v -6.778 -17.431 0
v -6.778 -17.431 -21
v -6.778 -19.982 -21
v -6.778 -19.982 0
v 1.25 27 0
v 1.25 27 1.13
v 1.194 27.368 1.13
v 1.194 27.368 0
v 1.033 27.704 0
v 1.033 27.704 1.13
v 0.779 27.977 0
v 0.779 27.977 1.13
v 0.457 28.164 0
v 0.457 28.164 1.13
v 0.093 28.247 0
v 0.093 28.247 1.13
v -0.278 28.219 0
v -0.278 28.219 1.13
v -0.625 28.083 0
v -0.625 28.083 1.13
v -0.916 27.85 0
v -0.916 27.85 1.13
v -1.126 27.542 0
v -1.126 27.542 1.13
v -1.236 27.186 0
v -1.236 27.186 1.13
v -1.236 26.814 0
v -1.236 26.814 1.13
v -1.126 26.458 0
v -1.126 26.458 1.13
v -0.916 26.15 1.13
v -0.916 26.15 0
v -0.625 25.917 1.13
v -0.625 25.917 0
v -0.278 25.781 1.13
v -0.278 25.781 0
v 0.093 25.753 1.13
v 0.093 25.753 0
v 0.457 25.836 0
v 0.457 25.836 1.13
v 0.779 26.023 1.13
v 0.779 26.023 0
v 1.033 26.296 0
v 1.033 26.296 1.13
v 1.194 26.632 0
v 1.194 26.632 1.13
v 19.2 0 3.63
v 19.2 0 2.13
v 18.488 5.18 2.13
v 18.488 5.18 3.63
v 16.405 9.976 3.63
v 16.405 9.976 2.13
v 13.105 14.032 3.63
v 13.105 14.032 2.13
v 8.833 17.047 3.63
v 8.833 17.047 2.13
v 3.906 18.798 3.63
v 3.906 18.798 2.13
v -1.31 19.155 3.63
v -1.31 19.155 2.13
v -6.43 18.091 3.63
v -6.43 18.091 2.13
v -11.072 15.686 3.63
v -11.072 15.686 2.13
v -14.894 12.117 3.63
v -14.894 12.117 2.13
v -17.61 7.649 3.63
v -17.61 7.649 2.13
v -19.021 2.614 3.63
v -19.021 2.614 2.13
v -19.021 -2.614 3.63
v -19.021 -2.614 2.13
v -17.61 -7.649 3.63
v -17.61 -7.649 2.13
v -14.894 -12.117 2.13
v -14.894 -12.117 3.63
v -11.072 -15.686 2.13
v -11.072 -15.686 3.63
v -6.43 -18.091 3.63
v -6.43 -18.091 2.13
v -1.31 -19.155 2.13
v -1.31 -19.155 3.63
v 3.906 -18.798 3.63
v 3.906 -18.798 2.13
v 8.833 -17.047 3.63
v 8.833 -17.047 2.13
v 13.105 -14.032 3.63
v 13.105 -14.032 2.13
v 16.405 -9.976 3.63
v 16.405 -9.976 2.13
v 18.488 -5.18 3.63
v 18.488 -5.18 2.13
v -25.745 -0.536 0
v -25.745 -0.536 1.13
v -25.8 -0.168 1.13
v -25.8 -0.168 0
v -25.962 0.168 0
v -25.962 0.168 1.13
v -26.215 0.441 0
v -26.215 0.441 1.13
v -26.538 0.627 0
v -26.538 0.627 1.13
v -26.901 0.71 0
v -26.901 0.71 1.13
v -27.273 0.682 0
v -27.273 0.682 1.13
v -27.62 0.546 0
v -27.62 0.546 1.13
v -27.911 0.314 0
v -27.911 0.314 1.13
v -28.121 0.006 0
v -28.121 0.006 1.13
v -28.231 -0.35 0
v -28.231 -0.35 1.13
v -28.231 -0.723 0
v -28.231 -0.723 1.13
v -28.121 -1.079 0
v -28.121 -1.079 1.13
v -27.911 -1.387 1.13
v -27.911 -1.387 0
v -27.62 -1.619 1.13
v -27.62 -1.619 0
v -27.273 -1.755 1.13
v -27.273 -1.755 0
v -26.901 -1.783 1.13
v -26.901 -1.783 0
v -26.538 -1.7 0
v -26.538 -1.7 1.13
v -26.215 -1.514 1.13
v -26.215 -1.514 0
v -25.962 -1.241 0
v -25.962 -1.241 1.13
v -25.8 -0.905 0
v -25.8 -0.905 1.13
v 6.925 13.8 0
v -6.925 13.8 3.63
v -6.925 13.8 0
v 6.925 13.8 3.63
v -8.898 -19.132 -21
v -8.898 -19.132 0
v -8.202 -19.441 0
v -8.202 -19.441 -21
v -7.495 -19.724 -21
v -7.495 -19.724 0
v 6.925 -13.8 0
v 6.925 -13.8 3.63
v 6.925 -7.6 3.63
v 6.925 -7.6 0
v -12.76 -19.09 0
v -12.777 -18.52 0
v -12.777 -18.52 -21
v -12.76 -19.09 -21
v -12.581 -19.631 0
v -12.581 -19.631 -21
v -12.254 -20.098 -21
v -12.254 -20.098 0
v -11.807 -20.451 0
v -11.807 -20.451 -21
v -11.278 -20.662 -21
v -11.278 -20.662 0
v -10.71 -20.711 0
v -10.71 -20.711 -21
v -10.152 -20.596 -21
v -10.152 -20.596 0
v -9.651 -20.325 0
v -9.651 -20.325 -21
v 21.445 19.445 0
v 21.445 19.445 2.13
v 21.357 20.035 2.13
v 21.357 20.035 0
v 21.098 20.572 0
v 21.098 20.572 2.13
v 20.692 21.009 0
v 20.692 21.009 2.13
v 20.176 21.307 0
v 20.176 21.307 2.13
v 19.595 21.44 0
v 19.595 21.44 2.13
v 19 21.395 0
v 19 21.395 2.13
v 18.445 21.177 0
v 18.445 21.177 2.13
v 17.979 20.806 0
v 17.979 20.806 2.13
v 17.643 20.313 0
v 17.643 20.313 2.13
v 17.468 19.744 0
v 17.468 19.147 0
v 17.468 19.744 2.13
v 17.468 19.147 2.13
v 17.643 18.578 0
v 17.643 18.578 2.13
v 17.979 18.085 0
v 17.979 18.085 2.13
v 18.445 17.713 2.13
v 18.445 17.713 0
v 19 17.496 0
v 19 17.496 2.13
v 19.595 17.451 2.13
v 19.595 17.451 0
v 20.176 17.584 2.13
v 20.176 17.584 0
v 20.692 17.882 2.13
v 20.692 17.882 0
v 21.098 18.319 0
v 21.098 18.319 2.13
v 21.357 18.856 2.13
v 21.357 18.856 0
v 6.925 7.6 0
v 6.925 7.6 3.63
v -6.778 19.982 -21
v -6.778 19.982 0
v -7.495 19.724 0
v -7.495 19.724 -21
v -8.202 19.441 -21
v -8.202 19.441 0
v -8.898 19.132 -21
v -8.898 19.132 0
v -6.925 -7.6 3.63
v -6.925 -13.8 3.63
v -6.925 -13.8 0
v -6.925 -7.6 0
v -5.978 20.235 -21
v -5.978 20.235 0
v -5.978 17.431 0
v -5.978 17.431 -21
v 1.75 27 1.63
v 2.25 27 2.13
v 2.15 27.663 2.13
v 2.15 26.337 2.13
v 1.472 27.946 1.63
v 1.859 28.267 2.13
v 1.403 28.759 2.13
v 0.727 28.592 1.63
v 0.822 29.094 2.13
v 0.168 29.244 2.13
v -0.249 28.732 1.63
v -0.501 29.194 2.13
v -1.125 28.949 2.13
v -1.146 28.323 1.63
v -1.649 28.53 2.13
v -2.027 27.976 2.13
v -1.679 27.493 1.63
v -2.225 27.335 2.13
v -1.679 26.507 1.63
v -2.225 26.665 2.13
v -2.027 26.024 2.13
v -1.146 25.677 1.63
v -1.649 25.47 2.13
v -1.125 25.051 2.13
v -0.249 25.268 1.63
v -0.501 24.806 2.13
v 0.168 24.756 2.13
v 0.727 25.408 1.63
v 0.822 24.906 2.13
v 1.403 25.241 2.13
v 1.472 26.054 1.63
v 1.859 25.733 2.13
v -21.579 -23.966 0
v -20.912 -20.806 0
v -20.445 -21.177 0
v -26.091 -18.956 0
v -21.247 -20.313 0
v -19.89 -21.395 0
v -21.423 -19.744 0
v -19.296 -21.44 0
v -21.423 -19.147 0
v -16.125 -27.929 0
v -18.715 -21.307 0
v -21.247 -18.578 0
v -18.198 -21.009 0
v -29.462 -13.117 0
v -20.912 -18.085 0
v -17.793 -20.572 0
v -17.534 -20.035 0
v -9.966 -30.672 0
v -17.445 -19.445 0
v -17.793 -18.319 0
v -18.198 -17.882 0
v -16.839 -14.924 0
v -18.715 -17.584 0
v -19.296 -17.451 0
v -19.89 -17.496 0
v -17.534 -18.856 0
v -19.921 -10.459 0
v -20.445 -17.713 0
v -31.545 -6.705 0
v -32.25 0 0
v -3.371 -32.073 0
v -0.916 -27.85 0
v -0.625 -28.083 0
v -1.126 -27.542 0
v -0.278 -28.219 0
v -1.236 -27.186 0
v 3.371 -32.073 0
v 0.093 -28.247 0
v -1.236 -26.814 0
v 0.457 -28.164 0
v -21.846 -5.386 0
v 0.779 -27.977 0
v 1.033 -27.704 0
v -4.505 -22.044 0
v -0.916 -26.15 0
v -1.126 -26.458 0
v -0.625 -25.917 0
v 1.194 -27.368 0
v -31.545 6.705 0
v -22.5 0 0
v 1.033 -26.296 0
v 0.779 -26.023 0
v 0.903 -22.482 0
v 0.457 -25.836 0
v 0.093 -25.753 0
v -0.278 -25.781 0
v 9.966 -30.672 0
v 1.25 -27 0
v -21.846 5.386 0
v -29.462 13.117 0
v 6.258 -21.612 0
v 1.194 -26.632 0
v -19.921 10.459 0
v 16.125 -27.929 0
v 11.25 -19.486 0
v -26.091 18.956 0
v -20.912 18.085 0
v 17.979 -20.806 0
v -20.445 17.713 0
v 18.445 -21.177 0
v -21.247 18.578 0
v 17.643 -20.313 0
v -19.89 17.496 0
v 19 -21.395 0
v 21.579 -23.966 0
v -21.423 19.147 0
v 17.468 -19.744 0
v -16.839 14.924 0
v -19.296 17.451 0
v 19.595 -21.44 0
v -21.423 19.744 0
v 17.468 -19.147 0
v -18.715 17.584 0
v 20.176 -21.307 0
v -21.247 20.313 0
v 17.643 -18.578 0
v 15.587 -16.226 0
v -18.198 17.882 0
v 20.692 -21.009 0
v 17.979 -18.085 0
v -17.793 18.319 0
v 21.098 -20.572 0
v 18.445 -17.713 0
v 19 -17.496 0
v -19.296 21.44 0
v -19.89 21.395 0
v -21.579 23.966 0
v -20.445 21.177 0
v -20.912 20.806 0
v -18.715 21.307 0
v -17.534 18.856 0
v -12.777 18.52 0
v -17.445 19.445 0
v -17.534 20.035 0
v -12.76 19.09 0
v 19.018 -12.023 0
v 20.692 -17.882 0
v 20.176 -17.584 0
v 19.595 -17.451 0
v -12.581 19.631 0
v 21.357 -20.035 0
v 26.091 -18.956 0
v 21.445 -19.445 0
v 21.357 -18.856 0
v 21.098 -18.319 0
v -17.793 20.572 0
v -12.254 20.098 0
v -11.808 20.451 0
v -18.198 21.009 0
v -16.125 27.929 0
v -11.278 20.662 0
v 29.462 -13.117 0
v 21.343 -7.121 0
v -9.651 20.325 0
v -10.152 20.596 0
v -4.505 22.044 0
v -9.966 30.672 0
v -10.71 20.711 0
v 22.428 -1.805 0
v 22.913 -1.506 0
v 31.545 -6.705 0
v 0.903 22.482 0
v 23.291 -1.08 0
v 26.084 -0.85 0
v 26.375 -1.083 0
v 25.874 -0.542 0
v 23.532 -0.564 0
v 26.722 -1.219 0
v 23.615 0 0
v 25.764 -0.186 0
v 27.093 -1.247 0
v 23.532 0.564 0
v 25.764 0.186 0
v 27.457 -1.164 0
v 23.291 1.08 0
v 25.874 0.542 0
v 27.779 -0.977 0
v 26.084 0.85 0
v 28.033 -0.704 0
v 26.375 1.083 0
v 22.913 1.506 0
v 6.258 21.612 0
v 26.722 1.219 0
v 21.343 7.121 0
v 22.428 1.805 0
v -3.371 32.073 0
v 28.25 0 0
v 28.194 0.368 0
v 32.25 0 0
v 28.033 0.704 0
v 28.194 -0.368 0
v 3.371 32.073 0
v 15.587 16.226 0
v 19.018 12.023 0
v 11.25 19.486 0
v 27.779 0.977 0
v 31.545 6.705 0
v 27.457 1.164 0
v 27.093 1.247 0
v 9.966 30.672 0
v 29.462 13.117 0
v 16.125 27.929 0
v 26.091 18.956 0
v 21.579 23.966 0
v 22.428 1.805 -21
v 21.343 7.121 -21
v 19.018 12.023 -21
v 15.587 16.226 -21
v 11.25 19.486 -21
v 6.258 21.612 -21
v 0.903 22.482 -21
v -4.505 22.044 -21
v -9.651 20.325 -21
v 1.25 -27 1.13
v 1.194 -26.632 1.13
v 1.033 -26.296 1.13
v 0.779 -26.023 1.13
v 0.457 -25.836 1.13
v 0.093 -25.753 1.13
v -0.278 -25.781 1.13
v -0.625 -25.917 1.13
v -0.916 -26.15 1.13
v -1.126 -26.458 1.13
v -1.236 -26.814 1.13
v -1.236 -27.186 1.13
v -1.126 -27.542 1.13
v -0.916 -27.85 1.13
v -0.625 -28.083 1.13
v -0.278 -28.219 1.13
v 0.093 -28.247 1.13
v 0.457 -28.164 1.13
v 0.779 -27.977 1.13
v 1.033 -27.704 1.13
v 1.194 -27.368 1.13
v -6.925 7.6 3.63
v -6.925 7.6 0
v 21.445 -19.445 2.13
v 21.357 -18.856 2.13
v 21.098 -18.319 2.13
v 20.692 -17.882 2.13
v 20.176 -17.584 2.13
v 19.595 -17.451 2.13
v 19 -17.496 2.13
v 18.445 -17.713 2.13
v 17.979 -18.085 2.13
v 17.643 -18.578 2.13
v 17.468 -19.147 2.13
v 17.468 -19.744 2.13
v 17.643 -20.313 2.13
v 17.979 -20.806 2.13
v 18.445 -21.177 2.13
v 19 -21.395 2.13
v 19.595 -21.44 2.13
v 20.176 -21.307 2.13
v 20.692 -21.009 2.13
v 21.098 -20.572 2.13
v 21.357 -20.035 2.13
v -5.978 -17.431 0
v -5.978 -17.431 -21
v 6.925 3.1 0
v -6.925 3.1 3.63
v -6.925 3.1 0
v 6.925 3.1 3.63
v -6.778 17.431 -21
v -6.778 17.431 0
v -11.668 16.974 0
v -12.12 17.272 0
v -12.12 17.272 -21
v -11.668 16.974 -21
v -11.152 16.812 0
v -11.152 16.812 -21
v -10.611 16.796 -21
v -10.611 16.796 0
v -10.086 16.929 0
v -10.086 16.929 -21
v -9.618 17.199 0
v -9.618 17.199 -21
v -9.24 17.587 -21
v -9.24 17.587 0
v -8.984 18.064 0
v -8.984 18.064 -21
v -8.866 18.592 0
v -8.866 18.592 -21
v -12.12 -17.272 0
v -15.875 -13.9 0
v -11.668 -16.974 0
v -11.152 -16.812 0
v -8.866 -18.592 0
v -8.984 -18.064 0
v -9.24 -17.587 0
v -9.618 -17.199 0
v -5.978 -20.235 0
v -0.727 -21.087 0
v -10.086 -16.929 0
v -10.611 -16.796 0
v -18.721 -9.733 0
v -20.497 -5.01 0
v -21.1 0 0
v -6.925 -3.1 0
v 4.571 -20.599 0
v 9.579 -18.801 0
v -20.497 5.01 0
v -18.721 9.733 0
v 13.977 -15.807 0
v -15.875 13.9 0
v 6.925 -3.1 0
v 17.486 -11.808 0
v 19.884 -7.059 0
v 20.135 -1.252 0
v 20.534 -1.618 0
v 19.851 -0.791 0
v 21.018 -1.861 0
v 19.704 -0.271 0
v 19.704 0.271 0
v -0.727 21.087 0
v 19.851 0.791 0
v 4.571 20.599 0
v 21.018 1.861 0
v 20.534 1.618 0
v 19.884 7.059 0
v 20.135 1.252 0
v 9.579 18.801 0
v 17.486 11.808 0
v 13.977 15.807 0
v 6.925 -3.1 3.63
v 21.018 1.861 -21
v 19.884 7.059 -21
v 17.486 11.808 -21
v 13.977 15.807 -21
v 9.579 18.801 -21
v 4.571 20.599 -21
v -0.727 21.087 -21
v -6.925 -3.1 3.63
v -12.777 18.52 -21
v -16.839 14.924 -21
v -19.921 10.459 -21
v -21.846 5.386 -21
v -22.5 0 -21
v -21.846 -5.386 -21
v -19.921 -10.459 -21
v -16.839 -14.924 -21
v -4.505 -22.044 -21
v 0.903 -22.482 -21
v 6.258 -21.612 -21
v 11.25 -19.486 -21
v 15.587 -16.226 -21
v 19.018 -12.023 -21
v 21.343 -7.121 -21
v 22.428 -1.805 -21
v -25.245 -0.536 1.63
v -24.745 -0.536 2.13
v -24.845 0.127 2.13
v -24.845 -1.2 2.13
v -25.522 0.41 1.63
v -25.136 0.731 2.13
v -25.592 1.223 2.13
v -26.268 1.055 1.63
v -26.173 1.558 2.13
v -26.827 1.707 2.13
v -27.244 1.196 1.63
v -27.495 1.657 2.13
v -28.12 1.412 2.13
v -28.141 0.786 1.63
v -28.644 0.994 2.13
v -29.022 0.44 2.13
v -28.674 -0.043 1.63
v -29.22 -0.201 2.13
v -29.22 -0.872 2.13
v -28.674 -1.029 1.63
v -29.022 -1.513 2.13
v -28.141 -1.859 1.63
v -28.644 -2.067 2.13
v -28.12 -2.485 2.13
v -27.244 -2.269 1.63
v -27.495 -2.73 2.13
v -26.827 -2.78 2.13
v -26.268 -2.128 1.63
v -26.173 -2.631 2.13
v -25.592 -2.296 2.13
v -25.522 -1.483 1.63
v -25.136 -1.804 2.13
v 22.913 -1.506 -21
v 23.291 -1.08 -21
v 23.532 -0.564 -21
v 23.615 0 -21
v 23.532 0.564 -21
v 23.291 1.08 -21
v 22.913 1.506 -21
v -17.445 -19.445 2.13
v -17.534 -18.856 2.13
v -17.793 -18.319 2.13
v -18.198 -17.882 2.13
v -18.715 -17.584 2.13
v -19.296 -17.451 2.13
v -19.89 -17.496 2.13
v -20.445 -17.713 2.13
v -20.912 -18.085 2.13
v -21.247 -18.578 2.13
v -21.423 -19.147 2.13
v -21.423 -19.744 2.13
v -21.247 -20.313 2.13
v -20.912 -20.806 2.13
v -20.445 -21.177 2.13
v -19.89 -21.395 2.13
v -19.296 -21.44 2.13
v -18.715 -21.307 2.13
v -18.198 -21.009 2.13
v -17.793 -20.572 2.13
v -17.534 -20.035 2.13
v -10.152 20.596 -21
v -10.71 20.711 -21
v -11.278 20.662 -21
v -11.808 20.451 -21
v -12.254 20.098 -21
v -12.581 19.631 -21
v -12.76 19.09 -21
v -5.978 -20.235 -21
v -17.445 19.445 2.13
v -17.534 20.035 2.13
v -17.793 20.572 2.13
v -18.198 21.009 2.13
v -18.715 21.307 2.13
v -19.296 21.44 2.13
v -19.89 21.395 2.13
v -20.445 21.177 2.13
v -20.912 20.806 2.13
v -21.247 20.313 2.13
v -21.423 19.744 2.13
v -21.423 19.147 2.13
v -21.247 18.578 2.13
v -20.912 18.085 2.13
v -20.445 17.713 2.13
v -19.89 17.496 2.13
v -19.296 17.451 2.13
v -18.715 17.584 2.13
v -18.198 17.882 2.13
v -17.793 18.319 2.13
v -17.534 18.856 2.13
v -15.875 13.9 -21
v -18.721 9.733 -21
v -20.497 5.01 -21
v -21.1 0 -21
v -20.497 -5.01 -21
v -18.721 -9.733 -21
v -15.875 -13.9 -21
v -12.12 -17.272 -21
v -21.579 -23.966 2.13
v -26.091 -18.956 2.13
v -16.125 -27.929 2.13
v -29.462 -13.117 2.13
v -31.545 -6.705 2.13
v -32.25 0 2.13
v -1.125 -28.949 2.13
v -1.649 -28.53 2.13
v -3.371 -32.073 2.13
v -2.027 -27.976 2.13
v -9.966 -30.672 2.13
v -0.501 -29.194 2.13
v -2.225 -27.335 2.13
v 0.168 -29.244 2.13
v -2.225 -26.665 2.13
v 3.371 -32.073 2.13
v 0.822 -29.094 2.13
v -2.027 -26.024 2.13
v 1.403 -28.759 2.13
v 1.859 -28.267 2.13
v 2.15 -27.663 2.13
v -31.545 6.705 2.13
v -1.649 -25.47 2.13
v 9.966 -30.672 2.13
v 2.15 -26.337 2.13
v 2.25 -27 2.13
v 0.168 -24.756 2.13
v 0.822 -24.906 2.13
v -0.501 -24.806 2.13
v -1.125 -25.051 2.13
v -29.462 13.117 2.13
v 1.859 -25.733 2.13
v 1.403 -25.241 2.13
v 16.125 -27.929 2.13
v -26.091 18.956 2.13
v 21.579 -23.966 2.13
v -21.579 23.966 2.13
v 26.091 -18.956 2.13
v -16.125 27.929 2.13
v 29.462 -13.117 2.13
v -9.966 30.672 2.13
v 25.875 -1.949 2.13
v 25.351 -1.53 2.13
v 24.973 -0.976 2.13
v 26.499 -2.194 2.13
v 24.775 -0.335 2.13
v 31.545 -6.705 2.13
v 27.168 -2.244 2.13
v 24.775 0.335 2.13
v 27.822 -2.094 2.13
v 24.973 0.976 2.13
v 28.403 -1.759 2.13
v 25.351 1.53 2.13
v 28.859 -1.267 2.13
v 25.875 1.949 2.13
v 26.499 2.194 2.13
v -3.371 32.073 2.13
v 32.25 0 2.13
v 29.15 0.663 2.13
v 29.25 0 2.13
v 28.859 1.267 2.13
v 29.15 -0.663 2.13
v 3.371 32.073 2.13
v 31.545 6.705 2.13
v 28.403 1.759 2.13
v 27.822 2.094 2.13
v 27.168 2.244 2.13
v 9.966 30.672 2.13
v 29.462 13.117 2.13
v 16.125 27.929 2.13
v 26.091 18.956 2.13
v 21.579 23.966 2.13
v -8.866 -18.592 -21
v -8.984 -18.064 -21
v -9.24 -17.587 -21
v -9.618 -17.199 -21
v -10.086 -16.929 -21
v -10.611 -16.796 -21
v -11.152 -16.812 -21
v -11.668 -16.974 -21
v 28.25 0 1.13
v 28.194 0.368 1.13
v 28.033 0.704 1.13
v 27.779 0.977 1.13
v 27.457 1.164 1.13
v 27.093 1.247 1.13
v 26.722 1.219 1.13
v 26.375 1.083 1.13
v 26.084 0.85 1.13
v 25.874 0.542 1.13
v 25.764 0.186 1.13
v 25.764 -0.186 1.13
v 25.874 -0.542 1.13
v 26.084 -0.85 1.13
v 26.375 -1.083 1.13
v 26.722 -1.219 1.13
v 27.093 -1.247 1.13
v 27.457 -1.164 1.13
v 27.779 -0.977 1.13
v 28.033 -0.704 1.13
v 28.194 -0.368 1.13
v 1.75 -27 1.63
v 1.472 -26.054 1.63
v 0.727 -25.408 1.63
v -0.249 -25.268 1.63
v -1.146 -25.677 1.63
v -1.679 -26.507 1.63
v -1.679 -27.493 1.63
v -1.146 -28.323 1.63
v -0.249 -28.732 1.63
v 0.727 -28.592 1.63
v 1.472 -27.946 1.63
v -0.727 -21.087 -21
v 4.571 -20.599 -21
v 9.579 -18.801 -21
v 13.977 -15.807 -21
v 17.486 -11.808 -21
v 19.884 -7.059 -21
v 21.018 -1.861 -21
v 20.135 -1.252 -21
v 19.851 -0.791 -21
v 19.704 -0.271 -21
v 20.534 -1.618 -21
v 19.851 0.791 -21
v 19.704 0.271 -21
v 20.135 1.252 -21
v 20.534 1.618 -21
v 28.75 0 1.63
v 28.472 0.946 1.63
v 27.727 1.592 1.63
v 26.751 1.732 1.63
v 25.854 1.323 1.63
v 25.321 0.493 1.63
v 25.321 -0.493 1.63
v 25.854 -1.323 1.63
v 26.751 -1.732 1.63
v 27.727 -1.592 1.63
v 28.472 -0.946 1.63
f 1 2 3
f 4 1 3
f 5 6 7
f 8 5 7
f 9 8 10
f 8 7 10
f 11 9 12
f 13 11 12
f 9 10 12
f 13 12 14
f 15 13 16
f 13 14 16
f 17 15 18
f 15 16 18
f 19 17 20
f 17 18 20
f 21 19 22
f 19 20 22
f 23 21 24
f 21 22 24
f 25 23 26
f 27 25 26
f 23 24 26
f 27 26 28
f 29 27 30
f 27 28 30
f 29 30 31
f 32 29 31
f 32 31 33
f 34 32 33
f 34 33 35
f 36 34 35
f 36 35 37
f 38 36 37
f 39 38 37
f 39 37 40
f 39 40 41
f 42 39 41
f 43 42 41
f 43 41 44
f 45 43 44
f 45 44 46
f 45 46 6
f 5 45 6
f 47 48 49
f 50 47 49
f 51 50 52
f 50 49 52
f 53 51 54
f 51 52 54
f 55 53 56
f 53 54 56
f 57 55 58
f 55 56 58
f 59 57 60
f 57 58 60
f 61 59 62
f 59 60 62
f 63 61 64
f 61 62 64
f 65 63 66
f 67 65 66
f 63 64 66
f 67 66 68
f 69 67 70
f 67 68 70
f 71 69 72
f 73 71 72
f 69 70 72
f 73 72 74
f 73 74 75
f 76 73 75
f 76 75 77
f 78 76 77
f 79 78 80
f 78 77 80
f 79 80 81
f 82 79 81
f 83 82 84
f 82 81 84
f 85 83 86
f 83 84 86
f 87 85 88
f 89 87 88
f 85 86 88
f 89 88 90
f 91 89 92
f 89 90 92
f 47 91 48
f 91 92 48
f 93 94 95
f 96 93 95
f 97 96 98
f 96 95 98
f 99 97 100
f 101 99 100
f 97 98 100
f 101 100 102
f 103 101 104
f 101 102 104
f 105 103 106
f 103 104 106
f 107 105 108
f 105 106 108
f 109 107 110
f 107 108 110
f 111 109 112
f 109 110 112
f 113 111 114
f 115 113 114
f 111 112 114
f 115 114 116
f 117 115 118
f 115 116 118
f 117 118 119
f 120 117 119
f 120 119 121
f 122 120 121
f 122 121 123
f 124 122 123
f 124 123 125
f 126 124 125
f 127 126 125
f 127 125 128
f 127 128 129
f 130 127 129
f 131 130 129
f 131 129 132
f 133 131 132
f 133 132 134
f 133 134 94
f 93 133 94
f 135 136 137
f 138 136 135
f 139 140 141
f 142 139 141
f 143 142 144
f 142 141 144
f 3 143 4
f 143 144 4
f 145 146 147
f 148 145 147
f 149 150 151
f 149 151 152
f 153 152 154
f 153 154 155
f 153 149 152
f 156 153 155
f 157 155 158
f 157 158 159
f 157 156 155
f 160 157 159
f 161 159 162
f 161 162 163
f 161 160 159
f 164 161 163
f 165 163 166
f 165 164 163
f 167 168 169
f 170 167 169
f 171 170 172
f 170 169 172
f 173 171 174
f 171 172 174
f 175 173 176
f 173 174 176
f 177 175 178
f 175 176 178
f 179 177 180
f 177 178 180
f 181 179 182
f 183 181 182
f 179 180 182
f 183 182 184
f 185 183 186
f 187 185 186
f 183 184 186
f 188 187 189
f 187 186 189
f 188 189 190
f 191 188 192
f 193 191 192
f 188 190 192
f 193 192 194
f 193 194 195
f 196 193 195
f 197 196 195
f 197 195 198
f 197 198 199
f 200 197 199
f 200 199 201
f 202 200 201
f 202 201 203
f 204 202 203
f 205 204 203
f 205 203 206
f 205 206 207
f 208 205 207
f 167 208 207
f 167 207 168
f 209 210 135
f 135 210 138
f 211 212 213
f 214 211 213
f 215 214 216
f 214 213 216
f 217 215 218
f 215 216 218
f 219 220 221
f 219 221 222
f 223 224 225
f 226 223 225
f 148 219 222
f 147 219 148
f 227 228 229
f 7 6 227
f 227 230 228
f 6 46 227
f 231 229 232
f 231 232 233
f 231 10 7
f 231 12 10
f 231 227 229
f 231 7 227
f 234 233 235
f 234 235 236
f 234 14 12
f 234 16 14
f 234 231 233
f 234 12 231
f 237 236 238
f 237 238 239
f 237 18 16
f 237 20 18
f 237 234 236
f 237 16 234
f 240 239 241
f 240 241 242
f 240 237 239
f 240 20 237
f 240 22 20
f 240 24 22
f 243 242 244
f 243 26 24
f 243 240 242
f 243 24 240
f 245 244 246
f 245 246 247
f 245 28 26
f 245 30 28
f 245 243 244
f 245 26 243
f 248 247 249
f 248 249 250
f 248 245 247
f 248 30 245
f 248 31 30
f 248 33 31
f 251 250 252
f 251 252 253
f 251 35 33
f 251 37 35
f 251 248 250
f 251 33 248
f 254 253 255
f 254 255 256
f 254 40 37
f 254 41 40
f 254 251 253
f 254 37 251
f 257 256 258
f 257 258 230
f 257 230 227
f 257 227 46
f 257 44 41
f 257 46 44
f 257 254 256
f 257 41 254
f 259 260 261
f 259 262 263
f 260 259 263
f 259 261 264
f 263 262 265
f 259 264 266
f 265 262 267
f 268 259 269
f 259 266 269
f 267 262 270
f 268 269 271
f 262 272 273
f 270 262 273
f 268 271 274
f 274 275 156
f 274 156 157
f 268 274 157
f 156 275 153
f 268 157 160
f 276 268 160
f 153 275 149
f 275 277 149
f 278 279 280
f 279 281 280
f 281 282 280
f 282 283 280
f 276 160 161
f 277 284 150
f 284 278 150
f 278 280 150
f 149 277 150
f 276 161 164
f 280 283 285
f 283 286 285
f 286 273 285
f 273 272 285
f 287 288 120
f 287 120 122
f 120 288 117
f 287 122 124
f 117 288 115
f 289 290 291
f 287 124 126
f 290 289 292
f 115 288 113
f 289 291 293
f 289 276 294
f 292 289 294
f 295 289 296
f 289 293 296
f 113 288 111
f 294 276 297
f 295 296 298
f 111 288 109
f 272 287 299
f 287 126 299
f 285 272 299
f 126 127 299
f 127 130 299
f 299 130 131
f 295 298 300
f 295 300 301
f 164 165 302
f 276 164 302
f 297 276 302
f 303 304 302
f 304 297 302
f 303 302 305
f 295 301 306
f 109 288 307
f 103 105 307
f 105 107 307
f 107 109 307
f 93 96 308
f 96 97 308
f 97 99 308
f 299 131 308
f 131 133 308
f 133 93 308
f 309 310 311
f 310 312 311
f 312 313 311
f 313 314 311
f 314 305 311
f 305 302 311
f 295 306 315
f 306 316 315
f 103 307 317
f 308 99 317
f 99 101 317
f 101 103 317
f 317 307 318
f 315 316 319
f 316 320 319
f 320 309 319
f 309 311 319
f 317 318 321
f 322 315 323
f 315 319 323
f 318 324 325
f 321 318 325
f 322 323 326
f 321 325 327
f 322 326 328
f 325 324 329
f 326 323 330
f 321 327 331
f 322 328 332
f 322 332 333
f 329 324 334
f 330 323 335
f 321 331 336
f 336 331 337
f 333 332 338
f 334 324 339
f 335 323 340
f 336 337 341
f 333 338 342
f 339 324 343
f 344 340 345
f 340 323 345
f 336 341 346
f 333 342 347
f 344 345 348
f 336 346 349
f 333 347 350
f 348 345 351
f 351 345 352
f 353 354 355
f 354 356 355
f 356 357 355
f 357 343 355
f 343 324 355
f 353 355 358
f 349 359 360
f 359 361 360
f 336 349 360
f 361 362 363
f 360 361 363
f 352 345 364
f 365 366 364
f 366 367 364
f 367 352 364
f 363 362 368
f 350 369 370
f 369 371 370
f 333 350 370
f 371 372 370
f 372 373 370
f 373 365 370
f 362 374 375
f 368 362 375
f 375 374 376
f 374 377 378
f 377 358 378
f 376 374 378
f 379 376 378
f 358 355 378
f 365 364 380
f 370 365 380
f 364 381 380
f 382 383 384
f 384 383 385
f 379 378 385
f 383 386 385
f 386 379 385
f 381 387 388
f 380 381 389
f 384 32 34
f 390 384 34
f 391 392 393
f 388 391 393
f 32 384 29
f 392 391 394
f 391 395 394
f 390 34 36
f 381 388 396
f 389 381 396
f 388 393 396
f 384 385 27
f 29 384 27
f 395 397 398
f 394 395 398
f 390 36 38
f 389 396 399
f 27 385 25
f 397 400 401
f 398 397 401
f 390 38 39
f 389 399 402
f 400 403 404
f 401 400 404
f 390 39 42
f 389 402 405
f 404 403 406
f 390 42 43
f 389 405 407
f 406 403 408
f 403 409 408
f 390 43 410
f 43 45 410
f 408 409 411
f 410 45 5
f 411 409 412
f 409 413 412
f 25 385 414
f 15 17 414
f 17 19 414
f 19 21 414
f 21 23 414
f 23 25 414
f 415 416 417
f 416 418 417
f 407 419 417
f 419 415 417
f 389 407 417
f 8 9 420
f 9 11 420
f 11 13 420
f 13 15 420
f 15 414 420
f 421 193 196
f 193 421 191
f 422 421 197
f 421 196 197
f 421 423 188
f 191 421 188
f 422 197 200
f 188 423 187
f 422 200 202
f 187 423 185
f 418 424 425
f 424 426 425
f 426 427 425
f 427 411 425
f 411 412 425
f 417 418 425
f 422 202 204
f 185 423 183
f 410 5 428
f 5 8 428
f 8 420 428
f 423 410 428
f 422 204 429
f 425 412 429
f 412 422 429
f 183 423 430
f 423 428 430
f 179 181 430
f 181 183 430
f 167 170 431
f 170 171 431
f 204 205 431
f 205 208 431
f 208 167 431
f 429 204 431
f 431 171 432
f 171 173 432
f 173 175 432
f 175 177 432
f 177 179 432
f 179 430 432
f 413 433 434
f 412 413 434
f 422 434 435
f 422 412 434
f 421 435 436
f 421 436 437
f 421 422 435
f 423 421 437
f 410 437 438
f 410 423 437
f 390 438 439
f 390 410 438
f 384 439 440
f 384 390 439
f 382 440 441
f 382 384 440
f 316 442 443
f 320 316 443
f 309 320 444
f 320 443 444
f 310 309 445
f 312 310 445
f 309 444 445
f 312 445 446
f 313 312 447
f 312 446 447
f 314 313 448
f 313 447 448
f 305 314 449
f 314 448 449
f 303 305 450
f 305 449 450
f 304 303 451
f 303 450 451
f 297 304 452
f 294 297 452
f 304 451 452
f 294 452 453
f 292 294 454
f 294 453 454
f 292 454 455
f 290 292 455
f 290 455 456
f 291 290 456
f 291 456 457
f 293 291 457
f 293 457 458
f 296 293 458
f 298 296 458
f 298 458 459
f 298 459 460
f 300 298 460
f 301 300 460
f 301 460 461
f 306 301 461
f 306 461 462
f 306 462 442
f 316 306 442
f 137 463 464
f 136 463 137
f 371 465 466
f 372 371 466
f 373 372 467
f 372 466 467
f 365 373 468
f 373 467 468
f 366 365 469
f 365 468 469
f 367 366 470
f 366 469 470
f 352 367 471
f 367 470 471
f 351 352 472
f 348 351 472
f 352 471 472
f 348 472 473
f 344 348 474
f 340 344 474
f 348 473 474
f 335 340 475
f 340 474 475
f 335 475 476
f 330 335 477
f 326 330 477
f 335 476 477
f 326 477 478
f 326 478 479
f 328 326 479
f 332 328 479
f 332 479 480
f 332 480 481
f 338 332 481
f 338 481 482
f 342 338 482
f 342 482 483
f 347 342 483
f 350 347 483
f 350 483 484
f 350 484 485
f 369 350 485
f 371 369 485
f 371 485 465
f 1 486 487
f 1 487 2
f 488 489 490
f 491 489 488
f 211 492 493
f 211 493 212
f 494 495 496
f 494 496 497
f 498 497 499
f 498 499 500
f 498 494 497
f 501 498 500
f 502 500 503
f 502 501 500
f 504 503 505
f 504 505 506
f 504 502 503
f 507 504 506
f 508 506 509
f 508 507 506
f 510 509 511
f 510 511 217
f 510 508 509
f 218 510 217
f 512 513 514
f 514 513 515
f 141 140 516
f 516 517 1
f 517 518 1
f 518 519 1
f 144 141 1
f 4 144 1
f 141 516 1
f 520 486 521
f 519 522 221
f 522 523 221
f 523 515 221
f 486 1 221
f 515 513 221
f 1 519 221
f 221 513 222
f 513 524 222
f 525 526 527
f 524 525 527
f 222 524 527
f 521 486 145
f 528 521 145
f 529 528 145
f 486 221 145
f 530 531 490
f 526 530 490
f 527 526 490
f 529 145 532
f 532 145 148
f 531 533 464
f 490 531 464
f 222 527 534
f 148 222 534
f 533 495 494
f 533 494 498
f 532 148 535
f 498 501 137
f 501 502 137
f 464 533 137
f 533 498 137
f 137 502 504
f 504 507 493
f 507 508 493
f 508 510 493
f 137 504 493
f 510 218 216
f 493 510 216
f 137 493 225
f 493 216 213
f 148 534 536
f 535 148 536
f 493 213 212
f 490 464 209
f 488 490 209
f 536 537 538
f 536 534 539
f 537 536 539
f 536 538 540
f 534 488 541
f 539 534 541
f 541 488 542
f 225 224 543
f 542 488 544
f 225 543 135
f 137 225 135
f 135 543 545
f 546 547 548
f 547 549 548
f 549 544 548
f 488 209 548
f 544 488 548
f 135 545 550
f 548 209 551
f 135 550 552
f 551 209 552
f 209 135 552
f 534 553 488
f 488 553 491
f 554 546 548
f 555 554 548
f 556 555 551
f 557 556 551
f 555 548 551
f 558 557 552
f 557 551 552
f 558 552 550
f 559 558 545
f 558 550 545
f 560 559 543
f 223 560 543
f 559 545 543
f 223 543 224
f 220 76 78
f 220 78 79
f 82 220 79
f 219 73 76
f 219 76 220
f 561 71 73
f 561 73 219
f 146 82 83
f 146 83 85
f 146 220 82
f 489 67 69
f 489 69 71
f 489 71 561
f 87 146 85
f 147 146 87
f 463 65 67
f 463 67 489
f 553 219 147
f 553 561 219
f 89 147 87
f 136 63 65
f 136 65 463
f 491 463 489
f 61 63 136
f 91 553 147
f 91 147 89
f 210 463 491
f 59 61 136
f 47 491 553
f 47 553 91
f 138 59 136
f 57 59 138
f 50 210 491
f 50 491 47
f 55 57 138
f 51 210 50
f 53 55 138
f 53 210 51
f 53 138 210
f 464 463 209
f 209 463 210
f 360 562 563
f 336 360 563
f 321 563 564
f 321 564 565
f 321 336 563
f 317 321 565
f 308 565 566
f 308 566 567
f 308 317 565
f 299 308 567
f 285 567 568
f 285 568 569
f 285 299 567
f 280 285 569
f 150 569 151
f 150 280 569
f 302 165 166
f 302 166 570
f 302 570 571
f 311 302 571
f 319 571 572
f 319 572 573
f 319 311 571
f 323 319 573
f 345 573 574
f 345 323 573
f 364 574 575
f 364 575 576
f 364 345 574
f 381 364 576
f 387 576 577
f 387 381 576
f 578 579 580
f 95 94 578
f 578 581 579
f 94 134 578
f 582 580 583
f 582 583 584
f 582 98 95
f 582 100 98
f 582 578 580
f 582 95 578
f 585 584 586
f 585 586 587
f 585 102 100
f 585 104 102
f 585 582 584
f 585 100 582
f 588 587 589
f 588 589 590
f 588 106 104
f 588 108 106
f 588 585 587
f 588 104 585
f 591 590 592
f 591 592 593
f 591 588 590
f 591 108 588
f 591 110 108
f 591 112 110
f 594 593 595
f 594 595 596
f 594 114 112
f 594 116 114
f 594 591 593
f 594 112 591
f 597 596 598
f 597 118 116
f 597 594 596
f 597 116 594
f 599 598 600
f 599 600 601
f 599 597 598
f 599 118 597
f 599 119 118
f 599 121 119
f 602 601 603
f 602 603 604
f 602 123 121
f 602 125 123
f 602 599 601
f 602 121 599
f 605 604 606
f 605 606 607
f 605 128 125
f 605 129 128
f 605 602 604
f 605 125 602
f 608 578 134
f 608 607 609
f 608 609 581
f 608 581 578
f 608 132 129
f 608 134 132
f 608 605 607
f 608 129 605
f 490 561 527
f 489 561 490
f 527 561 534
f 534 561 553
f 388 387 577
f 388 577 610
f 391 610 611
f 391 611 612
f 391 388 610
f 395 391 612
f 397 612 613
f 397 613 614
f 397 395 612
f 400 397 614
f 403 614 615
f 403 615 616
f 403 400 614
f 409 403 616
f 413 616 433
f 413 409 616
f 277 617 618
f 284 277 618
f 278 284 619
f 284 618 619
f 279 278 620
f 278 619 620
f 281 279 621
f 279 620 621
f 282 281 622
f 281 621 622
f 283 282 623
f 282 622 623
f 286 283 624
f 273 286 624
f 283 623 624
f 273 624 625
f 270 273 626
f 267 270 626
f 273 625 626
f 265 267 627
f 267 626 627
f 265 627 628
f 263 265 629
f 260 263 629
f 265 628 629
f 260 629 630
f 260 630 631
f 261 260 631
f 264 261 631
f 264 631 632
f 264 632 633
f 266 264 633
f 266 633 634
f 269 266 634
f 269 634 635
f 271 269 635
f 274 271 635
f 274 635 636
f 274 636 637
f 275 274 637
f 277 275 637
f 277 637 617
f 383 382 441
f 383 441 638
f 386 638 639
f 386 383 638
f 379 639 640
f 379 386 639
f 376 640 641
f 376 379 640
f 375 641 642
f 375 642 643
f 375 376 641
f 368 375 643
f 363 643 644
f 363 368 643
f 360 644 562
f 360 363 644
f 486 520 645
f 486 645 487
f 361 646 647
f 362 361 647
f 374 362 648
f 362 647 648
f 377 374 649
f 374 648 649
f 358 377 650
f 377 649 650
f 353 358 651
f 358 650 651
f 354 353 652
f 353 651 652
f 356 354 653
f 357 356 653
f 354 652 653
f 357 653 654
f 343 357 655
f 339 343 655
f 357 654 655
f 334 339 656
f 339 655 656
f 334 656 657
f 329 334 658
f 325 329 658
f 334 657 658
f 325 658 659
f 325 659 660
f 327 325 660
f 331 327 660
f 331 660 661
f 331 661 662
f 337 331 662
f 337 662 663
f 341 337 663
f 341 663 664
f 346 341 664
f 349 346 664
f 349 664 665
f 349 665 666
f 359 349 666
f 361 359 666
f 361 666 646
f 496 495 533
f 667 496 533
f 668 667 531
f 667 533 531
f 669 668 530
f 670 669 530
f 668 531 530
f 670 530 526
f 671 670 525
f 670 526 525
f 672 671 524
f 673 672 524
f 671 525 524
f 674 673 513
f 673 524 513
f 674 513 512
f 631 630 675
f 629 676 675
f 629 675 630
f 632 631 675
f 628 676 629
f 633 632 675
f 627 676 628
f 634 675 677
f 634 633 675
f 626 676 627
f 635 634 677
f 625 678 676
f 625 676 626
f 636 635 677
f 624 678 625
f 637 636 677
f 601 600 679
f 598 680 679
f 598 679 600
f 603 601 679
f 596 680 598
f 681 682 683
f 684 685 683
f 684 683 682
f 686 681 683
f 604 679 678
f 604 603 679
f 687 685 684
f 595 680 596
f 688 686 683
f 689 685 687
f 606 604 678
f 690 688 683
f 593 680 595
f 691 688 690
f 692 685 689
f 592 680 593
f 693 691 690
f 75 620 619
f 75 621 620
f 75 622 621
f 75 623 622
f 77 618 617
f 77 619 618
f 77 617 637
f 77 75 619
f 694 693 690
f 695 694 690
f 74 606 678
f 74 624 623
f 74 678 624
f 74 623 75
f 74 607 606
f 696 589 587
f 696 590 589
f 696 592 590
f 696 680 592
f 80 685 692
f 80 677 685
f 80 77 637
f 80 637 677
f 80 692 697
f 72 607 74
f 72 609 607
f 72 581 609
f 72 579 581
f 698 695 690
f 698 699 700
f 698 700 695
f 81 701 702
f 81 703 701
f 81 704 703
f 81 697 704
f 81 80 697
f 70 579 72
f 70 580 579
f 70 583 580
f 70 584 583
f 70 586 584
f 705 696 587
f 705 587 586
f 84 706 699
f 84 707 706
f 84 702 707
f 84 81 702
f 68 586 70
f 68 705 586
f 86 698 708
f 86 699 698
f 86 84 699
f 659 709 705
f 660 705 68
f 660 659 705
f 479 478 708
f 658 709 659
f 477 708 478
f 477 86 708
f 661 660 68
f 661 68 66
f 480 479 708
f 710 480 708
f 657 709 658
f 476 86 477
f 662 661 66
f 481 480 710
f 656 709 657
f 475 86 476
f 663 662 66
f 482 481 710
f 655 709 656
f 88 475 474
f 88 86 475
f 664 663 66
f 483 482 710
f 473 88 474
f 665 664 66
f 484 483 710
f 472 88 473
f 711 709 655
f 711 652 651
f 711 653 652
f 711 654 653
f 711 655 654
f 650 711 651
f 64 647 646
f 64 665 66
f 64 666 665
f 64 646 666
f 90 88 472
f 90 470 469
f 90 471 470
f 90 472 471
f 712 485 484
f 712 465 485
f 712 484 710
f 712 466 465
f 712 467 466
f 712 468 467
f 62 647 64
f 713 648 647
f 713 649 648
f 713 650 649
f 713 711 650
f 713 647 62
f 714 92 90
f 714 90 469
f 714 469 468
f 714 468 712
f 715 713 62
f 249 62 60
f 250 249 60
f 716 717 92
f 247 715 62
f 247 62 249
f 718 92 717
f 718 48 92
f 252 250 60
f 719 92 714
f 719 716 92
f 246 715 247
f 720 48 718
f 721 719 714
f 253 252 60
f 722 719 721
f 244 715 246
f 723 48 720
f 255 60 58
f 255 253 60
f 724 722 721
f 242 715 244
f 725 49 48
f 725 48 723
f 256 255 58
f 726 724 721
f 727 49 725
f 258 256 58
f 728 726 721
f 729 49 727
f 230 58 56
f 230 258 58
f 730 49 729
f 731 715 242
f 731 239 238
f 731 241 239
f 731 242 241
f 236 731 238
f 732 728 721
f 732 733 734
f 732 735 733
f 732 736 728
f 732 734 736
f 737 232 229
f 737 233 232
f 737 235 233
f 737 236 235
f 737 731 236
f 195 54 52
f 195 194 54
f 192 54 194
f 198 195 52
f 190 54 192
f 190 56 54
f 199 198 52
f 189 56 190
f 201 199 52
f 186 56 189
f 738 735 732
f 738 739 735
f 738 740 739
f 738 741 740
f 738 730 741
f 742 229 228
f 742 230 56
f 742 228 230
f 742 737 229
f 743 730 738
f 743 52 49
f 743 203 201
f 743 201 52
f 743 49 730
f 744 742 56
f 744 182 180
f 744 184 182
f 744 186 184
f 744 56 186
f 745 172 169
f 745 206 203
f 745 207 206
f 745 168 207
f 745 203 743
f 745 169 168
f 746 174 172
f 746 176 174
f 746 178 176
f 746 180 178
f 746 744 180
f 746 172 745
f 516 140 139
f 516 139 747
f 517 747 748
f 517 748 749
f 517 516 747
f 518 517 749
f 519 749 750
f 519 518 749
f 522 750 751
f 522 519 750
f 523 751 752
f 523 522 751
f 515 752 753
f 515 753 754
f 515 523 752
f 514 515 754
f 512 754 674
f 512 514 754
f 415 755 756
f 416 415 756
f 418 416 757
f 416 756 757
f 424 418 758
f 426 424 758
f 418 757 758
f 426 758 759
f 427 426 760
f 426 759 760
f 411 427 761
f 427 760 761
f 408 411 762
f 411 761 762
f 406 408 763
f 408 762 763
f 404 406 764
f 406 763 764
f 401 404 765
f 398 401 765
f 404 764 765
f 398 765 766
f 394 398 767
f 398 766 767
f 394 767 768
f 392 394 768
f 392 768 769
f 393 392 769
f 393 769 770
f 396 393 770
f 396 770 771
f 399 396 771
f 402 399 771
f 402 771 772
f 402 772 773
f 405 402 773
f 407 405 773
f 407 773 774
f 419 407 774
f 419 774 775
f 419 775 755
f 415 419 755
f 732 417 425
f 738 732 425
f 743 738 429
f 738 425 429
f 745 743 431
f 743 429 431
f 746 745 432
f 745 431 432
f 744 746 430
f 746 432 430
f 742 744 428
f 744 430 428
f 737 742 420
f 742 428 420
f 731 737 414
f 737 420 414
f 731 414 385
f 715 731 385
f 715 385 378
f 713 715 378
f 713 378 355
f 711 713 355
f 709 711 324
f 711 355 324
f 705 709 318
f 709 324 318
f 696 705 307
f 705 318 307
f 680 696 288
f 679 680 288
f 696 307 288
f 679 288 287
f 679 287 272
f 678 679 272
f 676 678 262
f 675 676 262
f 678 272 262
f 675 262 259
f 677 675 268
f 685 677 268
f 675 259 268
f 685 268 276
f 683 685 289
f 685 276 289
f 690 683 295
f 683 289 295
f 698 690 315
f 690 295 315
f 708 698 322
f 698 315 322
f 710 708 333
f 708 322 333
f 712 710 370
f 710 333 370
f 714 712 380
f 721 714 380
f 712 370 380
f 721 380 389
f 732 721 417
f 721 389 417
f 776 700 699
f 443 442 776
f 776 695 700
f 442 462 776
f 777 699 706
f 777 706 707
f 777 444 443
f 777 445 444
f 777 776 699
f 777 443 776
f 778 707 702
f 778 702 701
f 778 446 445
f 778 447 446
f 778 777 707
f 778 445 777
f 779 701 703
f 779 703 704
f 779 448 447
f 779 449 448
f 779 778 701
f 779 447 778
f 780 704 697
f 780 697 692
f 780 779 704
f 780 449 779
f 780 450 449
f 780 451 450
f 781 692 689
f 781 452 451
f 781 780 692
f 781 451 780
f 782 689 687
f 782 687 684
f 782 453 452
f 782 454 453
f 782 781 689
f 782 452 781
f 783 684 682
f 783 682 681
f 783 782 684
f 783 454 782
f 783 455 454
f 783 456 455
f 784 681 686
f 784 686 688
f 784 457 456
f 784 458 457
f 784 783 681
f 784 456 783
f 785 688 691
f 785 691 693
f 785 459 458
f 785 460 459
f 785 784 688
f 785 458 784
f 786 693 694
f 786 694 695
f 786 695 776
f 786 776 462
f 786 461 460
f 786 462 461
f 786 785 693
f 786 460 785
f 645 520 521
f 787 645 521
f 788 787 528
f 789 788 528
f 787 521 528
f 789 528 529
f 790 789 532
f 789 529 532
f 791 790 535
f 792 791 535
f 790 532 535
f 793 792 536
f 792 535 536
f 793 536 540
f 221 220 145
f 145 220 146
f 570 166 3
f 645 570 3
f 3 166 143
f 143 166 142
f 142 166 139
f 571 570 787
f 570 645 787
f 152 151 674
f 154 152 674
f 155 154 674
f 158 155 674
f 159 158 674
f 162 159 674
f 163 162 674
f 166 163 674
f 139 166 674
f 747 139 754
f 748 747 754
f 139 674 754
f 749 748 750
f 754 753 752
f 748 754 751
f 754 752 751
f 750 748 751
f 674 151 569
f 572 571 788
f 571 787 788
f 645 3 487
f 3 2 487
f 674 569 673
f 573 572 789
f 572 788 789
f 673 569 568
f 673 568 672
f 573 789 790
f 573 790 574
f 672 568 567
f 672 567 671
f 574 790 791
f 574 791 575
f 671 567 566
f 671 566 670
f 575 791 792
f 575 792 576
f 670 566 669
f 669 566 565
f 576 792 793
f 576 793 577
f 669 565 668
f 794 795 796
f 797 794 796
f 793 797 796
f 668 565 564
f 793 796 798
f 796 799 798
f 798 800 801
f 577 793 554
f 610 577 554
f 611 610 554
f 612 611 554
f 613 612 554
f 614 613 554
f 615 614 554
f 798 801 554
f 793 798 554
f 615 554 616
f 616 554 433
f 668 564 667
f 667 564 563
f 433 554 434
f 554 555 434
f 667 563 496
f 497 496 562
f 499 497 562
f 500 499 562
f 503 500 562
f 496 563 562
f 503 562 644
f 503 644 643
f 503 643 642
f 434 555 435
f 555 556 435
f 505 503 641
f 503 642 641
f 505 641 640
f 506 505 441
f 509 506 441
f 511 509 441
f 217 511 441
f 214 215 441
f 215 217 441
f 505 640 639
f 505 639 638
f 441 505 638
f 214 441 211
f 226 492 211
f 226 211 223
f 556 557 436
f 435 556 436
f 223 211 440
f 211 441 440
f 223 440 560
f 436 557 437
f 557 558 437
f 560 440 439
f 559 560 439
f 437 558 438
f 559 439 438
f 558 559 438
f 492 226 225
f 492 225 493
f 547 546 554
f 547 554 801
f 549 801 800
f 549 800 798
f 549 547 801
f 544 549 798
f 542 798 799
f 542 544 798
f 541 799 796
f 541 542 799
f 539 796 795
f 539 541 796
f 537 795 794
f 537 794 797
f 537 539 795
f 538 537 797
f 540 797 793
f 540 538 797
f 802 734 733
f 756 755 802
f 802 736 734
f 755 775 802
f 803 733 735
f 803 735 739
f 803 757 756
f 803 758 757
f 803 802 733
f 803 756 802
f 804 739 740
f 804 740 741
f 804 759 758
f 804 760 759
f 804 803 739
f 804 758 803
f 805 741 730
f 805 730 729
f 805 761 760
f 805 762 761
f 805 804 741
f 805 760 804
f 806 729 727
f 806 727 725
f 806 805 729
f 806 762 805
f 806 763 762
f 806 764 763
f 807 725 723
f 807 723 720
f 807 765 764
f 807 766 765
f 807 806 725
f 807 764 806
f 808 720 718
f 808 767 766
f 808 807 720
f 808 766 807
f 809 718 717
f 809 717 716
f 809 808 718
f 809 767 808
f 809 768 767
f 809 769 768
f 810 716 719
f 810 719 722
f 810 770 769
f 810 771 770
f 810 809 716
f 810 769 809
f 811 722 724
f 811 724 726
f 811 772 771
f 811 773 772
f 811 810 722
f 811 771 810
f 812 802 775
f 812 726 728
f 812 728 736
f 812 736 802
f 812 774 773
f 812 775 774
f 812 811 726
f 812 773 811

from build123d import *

# Parameters (mm, degrees)
SKETCH_R          = 32.25
PAD_DEPTH         = 2.13
SKETCH004_R       = 1.25
SKETCH004_R_2     = 2
POCKET001_DEPTH   = 5
CHAMFER_SIZE      = 1
SKETCH001_R       = 19.2
PAD001_DEPTH      = 1.5
SKETCH003_W       = 13.85
SKETCH003_H       = 6.2
POCKET_DEPTH      = 2.131
POCKET_DEPTH_BACK = 1.501
SKETCH009_R       = 18
POCKET002_DEPTH   = 2
PAD002_DEPTH      = 21


with BuildPart() as part:
    # Sketch → Pad (new body)
    with BuildSketch(Plane.XY):
        Circle(SKETCH_R)
    extrude(amount=PAD_DEPTH)

    # Sketch004 → Pocket001 (cut)
    with BuildSketch(Plane.XY.offset(2.13)):
        with Locations((0, 27)):
            Circle(SKETCH004_R)
        with Locations((19.445436, 19.445436)):
            Circle(SKETCH004_R_2)
        with Locations((27, 0)):
            Circle(SKETCH004_R)
        with Locations((0, -27)):
            Circle(SKETCH004_R)
        with Locations((-19.445436, -19.445436)):
            Circle(SKETCH004_R_2)
        with Locations((-19.445436, 19.445436)):
            Circle(SKETCH004_R_2)
        with Locations((19.445436, -19.445436)):
            Circle(SKETCH004_R_2)
        with Locations((-26.994671, -0.536434)):
            Circle(SKETCH004_R)
    extrude(amount=-POCKET001_DEPTH, mode=Mode.SUBTRACT)

    # Chamfer
    chamfer_edges = [part.edges().sort_by_distance(p)[0] for p in [
        (25.75, 0, 2.13),
        (-1.25, 27, 2.13),
        (-28.244671, -0.536434, 2.13),
        (-1.25, -27, 2.13),
    ]]
    chamfer(chamfer_edges, length=CHAMFER_SIZE)

    # Sketch001 → Pad001 (join)
    with BuildSketch(Plane.XY.offset(2.13)):
        Circle(SKETCH001_R)
    extrude(amount=PAD001_DEPTH)

    # Sketch003 → Pocket (cut, two sides)
    with BuildSketch(Plane.XY.offset(2.13)) as pocket_sk:
        Rectangle(SKETCH003_W, SKETCH003_H)
        with Locations((0, -10.7)):
            Rectangle(SKETCH003_W, SKETCH003_H)
        with Locations((0, 10.7)):
            Rectangle(SKETCH003_W, SKETCH003_H)
    extrude(amount=-POCKET_DEPTH, mode=Mode.SUBTRACT)
    extrude(pocket_sk.sketch, amount=POCKET_DEPTH_BACK, mode=Mode.SUBTRACT)

    # Sketch009 → Pocket002 (cut)
    with BuildSketch(Plane.XY):
        Circle(SKETCH009_R)
    extrude(amount=-POCKET002_DEPTH, mode=Mode.SUBTRACT)

    # Sketch006 → Pad002 (join)
    with BuildSketch(Plane(origin=(0, 0, 0), x_dir=(0.866025, 0.5, 0), z_dir=(0, 0, 1))):
        with BuildLine():
            ThreePointArc((-1.804633, 22.427512), (-19.485572, 11.25), (-20.325112, -9.650898))
            ThreePointArc((-20.325112, -9.650898), (-20.45119, -11.8075), (-18.520479, -12.776614))
            ThreePointArc((-18.520479, -12.776614), (0, -22.5), (18.520479, -12.776614))
            ThreePointArc((18.520479, -12.776614), (20.45119, -11.8075), (20.325112, -9.650898))
            ThreePointArc((20.325112, -9.650898), (19.485572, 11.25), (1.804633, 22.427512))
            ThreePointArc((1.804633, 22.427512), (0, 23.615), (-1.804633, 22.427512))
        make_face()
        with BuildLine():
            ThreePointArc((-1.860528, 21.017812), (-18.273136, 10.55), (-19.132223, -8.897642))
            ThreePointArc((-17.271696, -12.120171), (-17.04771, -9.8425), (-19.132223, -8.897642))
            ThreePointArc((-17.271696, -12.120171), (-16.59064, -13.036896), (-15.860983, -13.915431))
            Line((-14.58548, -11.706194), (-15.860983, -13.915431))
            Line((-13.892659, -12.106194), (-14.58548, -11.706194))
            Line((-15.29504, -14.53519), (-13.892659, -12.106194))
            ThreePointArc((-15.29504, -14.53519), (1.560407, -21.042223), (17.271696, -12.120171))
            ThreePointArc((19.132223, -8.897642), (17.04771, -9.8425), (17.271696, -12.120171))
            ThreePointArc((19.132223, -8.897642), (19.003303, 9.169759), (4.940323, 20.513488))
            Line((4.940323, 20.513488), (3.537942, 18.084493))
            Line((3.537942, 18.084493), (2.845122, 18.484493))
            Line((2.845122, 18.484493), (4.120625, 20.69373))
            ThreePointArc((4.120625, 20.69373), (2.994963, 20.886364), (1.860528, 21.017812))
            ThreePointArc((-1.860528, 21.017812), (0, 19.685), (1.860528, 21.017812))
        make_face(mode=Mode.SUBTRACT)
    extrude(amount=-PAD002_DEPTH)


solid = part.part
